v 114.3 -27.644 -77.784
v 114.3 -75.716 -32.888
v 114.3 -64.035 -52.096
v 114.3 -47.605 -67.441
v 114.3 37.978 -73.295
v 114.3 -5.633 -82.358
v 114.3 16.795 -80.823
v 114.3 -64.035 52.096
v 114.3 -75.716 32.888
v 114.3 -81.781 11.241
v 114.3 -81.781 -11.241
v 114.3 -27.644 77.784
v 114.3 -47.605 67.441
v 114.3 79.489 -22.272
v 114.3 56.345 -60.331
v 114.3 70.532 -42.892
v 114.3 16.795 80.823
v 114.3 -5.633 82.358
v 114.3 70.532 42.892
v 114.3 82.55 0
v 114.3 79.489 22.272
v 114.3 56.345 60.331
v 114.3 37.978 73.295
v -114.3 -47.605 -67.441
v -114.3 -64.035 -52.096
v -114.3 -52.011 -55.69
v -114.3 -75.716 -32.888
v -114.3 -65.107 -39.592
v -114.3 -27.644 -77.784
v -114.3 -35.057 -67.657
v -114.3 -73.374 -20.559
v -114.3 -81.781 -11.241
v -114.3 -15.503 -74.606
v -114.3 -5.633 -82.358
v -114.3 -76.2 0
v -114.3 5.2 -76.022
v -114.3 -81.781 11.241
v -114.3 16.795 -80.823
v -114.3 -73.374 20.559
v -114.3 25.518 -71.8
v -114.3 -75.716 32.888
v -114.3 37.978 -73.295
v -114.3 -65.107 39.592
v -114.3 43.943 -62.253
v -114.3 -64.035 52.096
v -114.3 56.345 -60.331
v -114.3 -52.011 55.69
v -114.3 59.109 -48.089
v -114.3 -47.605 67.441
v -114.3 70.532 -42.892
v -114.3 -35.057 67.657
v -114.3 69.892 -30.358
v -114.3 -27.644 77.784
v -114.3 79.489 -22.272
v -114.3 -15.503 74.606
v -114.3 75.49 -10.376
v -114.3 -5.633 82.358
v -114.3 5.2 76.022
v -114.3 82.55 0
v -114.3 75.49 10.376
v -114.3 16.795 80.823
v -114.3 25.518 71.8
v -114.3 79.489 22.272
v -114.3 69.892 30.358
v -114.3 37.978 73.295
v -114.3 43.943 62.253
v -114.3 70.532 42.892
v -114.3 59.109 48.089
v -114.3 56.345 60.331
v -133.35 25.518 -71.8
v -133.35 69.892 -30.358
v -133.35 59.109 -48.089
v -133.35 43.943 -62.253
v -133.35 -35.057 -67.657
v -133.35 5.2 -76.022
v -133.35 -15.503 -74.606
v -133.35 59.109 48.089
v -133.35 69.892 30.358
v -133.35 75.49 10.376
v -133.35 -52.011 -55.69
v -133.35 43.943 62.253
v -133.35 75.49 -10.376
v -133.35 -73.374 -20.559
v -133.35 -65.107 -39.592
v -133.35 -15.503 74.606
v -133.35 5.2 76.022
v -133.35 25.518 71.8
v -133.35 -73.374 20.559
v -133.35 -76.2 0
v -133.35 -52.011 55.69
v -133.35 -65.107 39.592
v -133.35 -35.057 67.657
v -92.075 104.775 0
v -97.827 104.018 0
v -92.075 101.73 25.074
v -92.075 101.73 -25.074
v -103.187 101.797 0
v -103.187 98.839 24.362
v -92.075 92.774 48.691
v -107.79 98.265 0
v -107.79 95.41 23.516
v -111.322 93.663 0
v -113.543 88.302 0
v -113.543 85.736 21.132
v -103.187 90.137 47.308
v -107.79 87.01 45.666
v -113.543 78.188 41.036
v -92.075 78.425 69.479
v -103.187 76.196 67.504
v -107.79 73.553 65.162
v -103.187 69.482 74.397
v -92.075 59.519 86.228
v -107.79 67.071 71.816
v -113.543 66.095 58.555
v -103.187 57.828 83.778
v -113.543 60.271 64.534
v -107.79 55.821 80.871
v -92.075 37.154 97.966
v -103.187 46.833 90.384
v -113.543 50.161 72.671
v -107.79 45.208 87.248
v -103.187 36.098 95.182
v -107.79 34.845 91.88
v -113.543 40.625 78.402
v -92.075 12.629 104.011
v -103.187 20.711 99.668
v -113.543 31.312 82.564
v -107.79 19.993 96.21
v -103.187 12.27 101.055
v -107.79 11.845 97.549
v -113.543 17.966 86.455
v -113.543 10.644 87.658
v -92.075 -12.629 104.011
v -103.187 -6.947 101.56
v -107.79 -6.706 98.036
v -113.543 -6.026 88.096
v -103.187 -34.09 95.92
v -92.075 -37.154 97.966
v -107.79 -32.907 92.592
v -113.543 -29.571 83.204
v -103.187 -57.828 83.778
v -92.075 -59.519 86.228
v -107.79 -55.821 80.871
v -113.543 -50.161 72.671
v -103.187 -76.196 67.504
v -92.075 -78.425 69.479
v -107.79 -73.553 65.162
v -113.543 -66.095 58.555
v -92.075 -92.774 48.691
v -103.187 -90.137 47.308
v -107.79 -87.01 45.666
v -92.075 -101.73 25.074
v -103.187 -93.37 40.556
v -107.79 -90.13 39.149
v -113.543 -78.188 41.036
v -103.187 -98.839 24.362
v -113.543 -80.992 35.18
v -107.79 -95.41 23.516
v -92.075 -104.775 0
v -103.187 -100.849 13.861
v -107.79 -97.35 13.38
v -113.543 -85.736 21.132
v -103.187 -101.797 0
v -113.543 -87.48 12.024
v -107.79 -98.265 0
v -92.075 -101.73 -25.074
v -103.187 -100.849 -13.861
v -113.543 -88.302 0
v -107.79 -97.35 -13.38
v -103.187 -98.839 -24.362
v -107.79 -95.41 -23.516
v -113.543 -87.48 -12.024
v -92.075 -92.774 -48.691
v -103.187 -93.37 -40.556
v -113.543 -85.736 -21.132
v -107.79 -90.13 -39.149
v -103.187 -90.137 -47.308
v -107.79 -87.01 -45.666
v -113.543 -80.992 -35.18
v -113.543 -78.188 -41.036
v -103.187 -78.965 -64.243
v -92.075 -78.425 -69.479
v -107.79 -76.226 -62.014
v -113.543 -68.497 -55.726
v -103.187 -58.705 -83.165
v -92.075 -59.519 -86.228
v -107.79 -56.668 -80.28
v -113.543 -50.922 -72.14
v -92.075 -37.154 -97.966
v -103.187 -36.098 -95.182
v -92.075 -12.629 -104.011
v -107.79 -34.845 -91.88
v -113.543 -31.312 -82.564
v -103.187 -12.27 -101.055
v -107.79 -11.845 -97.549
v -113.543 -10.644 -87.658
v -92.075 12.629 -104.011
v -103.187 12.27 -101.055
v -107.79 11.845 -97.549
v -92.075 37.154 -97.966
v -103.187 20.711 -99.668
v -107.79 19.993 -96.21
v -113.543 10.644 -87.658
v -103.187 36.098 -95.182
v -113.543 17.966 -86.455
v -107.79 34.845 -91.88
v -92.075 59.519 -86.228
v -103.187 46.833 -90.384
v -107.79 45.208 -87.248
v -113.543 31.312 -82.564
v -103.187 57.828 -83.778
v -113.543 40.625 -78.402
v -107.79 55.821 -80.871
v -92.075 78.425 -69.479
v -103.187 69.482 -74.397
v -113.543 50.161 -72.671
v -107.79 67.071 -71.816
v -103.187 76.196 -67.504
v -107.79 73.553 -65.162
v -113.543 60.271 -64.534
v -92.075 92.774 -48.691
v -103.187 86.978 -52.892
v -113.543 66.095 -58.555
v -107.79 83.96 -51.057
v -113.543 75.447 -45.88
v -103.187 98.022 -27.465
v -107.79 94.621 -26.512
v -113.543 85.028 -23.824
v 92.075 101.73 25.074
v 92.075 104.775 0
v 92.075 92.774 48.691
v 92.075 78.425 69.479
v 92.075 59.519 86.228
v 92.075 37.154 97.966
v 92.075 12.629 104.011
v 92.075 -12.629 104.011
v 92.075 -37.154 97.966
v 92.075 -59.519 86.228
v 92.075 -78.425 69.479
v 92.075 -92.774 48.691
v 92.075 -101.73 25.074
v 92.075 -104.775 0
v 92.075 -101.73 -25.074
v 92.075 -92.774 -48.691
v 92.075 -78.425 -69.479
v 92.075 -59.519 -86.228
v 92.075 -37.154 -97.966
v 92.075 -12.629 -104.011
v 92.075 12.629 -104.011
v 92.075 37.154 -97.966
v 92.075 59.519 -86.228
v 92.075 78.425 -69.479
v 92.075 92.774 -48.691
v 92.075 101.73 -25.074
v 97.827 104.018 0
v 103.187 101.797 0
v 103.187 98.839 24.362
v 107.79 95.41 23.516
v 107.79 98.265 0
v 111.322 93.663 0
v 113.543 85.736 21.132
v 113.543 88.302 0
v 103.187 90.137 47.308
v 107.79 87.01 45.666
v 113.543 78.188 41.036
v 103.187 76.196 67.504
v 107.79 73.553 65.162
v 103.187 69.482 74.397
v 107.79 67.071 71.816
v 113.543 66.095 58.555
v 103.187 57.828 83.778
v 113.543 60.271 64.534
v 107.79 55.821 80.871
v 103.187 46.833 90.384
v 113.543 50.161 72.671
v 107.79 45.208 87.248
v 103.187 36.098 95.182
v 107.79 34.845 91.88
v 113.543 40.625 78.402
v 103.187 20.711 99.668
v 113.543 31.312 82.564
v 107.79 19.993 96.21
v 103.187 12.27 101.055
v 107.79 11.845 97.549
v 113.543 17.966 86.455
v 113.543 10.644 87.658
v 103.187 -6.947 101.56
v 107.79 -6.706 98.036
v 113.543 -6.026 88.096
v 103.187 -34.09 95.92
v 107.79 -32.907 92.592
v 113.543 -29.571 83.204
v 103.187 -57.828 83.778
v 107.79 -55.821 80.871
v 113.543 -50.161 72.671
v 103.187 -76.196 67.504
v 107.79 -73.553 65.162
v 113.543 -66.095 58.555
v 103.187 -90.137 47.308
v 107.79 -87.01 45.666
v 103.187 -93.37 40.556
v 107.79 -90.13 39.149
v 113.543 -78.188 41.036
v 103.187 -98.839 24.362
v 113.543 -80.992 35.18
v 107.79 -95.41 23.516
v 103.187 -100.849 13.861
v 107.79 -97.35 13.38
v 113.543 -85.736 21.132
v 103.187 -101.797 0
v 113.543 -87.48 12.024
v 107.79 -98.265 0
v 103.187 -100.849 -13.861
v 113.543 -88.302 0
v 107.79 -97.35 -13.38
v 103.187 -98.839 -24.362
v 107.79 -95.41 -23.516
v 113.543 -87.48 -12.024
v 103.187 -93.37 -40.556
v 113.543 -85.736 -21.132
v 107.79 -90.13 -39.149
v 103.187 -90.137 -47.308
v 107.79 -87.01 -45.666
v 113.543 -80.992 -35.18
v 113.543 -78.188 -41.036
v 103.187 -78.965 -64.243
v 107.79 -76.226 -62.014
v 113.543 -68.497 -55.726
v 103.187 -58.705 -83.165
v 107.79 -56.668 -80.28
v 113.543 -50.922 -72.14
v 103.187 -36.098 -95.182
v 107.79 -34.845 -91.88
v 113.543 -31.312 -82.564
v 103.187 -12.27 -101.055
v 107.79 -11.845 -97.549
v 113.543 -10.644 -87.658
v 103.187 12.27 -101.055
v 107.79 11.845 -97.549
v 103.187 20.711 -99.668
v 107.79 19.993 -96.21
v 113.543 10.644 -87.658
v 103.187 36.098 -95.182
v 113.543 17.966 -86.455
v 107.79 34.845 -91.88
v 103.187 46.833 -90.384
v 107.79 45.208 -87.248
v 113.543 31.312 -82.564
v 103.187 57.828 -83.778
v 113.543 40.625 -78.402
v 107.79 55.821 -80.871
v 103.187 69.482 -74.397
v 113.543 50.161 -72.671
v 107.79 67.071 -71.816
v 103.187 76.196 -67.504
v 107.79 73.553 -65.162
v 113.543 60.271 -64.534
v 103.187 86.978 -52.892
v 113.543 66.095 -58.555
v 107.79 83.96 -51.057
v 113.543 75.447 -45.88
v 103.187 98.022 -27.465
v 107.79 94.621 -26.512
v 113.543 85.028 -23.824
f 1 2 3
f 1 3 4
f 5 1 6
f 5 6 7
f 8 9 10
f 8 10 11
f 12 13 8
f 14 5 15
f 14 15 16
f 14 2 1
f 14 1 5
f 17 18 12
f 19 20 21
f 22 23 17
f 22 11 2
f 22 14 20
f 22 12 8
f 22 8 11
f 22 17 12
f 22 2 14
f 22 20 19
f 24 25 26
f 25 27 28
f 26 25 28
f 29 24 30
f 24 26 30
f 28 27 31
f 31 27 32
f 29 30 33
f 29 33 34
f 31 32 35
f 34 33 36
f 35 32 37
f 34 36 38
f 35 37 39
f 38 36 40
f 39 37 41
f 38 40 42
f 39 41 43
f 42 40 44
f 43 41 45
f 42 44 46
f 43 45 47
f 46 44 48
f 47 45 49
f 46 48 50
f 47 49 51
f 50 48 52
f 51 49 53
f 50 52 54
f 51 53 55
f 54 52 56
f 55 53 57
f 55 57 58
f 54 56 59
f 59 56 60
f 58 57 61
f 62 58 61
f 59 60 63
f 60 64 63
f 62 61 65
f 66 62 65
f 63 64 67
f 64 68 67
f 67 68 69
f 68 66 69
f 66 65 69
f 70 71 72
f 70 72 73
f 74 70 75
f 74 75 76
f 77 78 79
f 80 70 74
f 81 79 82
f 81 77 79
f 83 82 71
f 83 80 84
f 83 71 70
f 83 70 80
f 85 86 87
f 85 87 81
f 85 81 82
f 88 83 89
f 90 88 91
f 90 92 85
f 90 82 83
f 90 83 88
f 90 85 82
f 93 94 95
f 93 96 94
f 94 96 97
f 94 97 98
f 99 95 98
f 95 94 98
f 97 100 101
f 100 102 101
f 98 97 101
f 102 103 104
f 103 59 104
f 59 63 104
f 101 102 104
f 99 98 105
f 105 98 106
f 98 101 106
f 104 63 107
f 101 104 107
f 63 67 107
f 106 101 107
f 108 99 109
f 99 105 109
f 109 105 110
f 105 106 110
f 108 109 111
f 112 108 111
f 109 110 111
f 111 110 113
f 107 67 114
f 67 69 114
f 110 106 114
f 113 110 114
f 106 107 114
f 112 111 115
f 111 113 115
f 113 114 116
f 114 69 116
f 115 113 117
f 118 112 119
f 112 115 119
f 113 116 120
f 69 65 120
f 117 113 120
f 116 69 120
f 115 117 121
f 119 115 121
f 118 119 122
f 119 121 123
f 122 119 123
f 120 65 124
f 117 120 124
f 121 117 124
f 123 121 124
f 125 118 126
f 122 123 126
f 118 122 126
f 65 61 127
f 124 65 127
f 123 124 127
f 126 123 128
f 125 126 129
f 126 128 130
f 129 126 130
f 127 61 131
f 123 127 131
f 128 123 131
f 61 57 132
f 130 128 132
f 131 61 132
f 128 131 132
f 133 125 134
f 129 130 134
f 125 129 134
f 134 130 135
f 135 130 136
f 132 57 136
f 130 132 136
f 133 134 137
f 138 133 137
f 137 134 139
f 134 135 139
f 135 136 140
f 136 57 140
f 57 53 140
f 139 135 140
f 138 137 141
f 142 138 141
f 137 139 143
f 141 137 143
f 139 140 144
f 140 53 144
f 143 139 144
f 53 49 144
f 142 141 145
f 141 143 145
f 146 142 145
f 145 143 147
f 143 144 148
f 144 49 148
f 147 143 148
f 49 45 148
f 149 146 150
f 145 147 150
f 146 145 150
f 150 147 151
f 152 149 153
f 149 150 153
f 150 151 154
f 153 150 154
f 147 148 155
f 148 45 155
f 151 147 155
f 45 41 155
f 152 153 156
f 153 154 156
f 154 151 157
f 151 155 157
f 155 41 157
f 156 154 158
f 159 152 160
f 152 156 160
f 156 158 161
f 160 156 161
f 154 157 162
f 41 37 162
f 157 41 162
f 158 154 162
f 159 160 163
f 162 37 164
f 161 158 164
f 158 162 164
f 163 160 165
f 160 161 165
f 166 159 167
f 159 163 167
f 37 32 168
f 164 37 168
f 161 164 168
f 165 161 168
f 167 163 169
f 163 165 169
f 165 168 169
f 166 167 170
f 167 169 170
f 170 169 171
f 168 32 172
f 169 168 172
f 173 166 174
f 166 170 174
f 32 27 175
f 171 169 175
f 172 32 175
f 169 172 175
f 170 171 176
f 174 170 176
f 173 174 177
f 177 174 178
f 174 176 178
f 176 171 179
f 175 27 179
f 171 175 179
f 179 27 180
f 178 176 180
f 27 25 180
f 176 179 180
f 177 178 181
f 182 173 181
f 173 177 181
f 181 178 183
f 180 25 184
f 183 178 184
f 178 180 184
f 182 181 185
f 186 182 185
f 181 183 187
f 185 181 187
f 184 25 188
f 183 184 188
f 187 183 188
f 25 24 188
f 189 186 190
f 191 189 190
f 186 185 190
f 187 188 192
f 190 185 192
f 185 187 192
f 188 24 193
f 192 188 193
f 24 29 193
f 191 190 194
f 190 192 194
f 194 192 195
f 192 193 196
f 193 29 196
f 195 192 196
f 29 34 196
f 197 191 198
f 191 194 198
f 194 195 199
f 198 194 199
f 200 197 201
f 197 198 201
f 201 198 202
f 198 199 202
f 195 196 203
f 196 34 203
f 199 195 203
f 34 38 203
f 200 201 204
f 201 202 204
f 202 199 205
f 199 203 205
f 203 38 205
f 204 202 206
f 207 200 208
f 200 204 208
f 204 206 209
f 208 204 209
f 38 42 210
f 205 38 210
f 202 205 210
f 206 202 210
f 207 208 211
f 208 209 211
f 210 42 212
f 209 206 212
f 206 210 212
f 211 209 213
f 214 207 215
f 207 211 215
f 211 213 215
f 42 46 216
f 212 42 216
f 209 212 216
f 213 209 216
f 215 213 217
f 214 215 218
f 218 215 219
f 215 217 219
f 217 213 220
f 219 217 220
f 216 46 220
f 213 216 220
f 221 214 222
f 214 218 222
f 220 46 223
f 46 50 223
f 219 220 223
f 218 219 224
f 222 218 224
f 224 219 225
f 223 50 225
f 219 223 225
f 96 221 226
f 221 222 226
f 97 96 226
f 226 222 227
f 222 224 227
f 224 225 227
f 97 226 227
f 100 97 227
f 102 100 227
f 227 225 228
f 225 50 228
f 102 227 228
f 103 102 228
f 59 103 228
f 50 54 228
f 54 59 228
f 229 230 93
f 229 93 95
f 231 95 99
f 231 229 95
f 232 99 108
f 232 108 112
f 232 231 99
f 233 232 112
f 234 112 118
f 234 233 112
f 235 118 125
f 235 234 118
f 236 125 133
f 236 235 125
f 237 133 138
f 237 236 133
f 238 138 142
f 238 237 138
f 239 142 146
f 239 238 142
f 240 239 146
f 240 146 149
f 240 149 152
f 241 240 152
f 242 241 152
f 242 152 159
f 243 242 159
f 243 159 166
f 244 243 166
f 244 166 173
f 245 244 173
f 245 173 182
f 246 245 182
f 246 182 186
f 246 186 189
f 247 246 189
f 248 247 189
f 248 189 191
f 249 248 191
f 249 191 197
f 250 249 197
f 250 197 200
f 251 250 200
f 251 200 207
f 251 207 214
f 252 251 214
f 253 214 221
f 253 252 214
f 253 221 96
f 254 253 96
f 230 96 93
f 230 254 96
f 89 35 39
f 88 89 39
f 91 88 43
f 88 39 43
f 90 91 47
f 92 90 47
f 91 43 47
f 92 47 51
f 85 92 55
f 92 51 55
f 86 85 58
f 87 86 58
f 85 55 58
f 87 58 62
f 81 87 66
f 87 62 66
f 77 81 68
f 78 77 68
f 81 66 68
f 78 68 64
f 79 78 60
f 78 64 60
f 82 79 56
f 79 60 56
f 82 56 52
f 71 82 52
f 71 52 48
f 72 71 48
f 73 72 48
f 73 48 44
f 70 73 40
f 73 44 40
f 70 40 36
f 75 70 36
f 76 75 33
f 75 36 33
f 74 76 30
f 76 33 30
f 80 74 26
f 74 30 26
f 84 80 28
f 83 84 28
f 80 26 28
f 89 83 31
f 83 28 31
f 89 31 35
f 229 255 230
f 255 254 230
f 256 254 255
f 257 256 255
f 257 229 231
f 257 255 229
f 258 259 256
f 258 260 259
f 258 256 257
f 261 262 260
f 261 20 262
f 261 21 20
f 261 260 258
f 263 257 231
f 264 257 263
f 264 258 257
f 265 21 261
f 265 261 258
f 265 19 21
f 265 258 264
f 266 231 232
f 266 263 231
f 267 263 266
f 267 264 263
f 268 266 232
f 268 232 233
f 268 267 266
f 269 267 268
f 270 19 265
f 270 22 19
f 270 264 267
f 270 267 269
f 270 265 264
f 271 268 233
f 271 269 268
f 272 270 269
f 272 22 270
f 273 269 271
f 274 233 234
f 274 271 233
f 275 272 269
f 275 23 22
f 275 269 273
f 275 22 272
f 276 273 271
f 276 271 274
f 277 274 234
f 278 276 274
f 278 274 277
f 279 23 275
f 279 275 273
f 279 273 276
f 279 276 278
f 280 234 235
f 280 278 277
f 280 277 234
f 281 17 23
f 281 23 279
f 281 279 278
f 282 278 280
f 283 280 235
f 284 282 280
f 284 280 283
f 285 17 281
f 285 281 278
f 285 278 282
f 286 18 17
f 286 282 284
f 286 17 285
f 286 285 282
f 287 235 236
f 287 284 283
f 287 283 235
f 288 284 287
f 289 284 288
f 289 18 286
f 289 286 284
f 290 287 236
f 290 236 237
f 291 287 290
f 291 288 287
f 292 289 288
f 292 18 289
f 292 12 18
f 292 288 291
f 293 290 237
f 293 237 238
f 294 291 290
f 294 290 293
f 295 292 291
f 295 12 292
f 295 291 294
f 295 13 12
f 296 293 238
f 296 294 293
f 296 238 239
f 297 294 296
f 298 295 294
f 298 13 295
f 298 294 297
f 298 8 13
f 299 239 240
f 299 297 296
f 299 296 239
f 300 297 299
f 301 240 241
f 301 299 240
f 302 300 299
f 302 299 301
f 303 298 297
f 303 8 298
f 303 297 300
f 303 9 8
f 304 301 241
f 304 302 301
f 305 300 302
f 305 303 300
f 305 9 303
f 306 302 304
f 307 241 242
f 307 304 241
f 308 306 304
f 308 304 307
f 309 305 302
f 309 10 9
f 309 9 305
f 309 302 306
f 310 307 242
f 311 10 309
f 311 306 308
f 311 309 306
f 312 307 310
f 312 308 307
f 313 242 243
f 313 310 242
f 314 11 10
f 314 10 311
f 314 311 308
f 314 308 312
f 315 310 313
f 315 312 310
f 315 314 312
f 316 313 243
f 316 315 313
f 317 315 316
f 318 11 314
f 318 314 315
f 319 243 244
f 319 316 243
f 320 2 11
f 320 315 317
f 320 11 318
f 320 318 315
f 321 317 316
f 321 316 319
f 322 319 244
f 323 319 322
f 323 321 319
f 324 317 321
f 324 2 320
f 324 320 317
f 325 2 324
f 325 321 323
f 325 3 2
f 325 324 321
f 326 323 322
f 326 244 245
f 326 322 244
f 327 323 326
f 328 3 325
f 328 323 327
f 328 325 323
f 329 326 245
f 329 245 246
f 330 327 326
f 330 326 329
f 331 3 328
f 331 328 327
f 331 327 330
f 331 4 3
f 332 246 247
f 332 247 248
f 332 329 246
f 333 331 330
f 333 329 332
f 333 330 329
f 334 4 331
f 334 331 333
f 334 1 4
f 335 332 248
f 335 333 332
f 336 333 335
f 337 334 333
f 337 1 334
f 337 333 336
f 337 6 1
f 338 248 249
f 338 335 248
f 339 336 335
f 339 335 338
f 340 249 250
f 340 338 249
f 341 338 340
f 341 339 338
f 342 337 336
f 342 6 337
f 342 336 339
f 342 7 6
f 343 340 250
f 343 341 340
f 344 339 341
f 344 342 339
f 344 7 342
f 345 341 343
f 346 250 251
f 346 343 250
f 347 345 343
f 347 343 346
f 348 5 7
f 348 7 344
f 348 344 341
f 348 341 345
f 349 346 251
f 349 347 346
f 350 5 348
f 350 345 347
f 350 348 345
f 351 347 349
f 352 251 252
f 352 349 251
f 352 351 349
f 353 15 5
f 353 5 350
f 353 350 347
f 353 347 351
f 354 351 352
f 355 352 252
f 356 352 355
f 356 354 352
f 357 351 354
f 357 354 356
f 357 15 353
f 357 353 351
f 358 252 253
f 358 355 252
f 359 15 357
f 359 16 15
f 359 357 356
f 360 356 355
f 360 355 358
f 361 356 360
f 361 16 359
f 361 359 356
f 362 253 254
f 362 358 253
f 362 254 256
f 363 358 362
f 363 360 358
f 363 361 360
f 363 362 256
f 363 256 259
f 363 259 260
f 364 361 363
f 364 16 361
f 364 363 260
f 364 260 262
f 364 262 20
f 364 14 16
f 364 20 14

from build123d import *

# Parameters (mm, degrees)
F0_R          = 104.775
F1_DEPTH      = 114.3
F1_DEPTH_BACK = 114.3
F2_R          = 76.2
F3_DEPTH      = 19.05
F4_R          = 22.225


with BuildPart() as f1:
    # F0 (on Right) → F1 (new body, two sides)
    with BuildSketch(Plane.YZ) as f1_sk:
        Circle(F0_R)
    extrude(amount=F1_DEPTH)
    extrude(f1_sk.sketch, amount=-F1_DEPTH_BACK)

    # F2 (on face) → F3 (join)
    with BuildSketch(Plane(origin=(-114.3, 0, 0), x_dir=(0, -1, 0), z_dir=(-1, 0, 0))):
        Circle(F2_R)
    extrude(amount=F3_DEPTH)

    # F4
    f4_edges = [f1.edges().sort_by_distance(p)[0] for p in [
        (-114.3, -104.775, 0),
        (114.3, -104.775, 0),
    ]]
    fillet(f4_edges, radius=F4_R)


solid = f1.part
